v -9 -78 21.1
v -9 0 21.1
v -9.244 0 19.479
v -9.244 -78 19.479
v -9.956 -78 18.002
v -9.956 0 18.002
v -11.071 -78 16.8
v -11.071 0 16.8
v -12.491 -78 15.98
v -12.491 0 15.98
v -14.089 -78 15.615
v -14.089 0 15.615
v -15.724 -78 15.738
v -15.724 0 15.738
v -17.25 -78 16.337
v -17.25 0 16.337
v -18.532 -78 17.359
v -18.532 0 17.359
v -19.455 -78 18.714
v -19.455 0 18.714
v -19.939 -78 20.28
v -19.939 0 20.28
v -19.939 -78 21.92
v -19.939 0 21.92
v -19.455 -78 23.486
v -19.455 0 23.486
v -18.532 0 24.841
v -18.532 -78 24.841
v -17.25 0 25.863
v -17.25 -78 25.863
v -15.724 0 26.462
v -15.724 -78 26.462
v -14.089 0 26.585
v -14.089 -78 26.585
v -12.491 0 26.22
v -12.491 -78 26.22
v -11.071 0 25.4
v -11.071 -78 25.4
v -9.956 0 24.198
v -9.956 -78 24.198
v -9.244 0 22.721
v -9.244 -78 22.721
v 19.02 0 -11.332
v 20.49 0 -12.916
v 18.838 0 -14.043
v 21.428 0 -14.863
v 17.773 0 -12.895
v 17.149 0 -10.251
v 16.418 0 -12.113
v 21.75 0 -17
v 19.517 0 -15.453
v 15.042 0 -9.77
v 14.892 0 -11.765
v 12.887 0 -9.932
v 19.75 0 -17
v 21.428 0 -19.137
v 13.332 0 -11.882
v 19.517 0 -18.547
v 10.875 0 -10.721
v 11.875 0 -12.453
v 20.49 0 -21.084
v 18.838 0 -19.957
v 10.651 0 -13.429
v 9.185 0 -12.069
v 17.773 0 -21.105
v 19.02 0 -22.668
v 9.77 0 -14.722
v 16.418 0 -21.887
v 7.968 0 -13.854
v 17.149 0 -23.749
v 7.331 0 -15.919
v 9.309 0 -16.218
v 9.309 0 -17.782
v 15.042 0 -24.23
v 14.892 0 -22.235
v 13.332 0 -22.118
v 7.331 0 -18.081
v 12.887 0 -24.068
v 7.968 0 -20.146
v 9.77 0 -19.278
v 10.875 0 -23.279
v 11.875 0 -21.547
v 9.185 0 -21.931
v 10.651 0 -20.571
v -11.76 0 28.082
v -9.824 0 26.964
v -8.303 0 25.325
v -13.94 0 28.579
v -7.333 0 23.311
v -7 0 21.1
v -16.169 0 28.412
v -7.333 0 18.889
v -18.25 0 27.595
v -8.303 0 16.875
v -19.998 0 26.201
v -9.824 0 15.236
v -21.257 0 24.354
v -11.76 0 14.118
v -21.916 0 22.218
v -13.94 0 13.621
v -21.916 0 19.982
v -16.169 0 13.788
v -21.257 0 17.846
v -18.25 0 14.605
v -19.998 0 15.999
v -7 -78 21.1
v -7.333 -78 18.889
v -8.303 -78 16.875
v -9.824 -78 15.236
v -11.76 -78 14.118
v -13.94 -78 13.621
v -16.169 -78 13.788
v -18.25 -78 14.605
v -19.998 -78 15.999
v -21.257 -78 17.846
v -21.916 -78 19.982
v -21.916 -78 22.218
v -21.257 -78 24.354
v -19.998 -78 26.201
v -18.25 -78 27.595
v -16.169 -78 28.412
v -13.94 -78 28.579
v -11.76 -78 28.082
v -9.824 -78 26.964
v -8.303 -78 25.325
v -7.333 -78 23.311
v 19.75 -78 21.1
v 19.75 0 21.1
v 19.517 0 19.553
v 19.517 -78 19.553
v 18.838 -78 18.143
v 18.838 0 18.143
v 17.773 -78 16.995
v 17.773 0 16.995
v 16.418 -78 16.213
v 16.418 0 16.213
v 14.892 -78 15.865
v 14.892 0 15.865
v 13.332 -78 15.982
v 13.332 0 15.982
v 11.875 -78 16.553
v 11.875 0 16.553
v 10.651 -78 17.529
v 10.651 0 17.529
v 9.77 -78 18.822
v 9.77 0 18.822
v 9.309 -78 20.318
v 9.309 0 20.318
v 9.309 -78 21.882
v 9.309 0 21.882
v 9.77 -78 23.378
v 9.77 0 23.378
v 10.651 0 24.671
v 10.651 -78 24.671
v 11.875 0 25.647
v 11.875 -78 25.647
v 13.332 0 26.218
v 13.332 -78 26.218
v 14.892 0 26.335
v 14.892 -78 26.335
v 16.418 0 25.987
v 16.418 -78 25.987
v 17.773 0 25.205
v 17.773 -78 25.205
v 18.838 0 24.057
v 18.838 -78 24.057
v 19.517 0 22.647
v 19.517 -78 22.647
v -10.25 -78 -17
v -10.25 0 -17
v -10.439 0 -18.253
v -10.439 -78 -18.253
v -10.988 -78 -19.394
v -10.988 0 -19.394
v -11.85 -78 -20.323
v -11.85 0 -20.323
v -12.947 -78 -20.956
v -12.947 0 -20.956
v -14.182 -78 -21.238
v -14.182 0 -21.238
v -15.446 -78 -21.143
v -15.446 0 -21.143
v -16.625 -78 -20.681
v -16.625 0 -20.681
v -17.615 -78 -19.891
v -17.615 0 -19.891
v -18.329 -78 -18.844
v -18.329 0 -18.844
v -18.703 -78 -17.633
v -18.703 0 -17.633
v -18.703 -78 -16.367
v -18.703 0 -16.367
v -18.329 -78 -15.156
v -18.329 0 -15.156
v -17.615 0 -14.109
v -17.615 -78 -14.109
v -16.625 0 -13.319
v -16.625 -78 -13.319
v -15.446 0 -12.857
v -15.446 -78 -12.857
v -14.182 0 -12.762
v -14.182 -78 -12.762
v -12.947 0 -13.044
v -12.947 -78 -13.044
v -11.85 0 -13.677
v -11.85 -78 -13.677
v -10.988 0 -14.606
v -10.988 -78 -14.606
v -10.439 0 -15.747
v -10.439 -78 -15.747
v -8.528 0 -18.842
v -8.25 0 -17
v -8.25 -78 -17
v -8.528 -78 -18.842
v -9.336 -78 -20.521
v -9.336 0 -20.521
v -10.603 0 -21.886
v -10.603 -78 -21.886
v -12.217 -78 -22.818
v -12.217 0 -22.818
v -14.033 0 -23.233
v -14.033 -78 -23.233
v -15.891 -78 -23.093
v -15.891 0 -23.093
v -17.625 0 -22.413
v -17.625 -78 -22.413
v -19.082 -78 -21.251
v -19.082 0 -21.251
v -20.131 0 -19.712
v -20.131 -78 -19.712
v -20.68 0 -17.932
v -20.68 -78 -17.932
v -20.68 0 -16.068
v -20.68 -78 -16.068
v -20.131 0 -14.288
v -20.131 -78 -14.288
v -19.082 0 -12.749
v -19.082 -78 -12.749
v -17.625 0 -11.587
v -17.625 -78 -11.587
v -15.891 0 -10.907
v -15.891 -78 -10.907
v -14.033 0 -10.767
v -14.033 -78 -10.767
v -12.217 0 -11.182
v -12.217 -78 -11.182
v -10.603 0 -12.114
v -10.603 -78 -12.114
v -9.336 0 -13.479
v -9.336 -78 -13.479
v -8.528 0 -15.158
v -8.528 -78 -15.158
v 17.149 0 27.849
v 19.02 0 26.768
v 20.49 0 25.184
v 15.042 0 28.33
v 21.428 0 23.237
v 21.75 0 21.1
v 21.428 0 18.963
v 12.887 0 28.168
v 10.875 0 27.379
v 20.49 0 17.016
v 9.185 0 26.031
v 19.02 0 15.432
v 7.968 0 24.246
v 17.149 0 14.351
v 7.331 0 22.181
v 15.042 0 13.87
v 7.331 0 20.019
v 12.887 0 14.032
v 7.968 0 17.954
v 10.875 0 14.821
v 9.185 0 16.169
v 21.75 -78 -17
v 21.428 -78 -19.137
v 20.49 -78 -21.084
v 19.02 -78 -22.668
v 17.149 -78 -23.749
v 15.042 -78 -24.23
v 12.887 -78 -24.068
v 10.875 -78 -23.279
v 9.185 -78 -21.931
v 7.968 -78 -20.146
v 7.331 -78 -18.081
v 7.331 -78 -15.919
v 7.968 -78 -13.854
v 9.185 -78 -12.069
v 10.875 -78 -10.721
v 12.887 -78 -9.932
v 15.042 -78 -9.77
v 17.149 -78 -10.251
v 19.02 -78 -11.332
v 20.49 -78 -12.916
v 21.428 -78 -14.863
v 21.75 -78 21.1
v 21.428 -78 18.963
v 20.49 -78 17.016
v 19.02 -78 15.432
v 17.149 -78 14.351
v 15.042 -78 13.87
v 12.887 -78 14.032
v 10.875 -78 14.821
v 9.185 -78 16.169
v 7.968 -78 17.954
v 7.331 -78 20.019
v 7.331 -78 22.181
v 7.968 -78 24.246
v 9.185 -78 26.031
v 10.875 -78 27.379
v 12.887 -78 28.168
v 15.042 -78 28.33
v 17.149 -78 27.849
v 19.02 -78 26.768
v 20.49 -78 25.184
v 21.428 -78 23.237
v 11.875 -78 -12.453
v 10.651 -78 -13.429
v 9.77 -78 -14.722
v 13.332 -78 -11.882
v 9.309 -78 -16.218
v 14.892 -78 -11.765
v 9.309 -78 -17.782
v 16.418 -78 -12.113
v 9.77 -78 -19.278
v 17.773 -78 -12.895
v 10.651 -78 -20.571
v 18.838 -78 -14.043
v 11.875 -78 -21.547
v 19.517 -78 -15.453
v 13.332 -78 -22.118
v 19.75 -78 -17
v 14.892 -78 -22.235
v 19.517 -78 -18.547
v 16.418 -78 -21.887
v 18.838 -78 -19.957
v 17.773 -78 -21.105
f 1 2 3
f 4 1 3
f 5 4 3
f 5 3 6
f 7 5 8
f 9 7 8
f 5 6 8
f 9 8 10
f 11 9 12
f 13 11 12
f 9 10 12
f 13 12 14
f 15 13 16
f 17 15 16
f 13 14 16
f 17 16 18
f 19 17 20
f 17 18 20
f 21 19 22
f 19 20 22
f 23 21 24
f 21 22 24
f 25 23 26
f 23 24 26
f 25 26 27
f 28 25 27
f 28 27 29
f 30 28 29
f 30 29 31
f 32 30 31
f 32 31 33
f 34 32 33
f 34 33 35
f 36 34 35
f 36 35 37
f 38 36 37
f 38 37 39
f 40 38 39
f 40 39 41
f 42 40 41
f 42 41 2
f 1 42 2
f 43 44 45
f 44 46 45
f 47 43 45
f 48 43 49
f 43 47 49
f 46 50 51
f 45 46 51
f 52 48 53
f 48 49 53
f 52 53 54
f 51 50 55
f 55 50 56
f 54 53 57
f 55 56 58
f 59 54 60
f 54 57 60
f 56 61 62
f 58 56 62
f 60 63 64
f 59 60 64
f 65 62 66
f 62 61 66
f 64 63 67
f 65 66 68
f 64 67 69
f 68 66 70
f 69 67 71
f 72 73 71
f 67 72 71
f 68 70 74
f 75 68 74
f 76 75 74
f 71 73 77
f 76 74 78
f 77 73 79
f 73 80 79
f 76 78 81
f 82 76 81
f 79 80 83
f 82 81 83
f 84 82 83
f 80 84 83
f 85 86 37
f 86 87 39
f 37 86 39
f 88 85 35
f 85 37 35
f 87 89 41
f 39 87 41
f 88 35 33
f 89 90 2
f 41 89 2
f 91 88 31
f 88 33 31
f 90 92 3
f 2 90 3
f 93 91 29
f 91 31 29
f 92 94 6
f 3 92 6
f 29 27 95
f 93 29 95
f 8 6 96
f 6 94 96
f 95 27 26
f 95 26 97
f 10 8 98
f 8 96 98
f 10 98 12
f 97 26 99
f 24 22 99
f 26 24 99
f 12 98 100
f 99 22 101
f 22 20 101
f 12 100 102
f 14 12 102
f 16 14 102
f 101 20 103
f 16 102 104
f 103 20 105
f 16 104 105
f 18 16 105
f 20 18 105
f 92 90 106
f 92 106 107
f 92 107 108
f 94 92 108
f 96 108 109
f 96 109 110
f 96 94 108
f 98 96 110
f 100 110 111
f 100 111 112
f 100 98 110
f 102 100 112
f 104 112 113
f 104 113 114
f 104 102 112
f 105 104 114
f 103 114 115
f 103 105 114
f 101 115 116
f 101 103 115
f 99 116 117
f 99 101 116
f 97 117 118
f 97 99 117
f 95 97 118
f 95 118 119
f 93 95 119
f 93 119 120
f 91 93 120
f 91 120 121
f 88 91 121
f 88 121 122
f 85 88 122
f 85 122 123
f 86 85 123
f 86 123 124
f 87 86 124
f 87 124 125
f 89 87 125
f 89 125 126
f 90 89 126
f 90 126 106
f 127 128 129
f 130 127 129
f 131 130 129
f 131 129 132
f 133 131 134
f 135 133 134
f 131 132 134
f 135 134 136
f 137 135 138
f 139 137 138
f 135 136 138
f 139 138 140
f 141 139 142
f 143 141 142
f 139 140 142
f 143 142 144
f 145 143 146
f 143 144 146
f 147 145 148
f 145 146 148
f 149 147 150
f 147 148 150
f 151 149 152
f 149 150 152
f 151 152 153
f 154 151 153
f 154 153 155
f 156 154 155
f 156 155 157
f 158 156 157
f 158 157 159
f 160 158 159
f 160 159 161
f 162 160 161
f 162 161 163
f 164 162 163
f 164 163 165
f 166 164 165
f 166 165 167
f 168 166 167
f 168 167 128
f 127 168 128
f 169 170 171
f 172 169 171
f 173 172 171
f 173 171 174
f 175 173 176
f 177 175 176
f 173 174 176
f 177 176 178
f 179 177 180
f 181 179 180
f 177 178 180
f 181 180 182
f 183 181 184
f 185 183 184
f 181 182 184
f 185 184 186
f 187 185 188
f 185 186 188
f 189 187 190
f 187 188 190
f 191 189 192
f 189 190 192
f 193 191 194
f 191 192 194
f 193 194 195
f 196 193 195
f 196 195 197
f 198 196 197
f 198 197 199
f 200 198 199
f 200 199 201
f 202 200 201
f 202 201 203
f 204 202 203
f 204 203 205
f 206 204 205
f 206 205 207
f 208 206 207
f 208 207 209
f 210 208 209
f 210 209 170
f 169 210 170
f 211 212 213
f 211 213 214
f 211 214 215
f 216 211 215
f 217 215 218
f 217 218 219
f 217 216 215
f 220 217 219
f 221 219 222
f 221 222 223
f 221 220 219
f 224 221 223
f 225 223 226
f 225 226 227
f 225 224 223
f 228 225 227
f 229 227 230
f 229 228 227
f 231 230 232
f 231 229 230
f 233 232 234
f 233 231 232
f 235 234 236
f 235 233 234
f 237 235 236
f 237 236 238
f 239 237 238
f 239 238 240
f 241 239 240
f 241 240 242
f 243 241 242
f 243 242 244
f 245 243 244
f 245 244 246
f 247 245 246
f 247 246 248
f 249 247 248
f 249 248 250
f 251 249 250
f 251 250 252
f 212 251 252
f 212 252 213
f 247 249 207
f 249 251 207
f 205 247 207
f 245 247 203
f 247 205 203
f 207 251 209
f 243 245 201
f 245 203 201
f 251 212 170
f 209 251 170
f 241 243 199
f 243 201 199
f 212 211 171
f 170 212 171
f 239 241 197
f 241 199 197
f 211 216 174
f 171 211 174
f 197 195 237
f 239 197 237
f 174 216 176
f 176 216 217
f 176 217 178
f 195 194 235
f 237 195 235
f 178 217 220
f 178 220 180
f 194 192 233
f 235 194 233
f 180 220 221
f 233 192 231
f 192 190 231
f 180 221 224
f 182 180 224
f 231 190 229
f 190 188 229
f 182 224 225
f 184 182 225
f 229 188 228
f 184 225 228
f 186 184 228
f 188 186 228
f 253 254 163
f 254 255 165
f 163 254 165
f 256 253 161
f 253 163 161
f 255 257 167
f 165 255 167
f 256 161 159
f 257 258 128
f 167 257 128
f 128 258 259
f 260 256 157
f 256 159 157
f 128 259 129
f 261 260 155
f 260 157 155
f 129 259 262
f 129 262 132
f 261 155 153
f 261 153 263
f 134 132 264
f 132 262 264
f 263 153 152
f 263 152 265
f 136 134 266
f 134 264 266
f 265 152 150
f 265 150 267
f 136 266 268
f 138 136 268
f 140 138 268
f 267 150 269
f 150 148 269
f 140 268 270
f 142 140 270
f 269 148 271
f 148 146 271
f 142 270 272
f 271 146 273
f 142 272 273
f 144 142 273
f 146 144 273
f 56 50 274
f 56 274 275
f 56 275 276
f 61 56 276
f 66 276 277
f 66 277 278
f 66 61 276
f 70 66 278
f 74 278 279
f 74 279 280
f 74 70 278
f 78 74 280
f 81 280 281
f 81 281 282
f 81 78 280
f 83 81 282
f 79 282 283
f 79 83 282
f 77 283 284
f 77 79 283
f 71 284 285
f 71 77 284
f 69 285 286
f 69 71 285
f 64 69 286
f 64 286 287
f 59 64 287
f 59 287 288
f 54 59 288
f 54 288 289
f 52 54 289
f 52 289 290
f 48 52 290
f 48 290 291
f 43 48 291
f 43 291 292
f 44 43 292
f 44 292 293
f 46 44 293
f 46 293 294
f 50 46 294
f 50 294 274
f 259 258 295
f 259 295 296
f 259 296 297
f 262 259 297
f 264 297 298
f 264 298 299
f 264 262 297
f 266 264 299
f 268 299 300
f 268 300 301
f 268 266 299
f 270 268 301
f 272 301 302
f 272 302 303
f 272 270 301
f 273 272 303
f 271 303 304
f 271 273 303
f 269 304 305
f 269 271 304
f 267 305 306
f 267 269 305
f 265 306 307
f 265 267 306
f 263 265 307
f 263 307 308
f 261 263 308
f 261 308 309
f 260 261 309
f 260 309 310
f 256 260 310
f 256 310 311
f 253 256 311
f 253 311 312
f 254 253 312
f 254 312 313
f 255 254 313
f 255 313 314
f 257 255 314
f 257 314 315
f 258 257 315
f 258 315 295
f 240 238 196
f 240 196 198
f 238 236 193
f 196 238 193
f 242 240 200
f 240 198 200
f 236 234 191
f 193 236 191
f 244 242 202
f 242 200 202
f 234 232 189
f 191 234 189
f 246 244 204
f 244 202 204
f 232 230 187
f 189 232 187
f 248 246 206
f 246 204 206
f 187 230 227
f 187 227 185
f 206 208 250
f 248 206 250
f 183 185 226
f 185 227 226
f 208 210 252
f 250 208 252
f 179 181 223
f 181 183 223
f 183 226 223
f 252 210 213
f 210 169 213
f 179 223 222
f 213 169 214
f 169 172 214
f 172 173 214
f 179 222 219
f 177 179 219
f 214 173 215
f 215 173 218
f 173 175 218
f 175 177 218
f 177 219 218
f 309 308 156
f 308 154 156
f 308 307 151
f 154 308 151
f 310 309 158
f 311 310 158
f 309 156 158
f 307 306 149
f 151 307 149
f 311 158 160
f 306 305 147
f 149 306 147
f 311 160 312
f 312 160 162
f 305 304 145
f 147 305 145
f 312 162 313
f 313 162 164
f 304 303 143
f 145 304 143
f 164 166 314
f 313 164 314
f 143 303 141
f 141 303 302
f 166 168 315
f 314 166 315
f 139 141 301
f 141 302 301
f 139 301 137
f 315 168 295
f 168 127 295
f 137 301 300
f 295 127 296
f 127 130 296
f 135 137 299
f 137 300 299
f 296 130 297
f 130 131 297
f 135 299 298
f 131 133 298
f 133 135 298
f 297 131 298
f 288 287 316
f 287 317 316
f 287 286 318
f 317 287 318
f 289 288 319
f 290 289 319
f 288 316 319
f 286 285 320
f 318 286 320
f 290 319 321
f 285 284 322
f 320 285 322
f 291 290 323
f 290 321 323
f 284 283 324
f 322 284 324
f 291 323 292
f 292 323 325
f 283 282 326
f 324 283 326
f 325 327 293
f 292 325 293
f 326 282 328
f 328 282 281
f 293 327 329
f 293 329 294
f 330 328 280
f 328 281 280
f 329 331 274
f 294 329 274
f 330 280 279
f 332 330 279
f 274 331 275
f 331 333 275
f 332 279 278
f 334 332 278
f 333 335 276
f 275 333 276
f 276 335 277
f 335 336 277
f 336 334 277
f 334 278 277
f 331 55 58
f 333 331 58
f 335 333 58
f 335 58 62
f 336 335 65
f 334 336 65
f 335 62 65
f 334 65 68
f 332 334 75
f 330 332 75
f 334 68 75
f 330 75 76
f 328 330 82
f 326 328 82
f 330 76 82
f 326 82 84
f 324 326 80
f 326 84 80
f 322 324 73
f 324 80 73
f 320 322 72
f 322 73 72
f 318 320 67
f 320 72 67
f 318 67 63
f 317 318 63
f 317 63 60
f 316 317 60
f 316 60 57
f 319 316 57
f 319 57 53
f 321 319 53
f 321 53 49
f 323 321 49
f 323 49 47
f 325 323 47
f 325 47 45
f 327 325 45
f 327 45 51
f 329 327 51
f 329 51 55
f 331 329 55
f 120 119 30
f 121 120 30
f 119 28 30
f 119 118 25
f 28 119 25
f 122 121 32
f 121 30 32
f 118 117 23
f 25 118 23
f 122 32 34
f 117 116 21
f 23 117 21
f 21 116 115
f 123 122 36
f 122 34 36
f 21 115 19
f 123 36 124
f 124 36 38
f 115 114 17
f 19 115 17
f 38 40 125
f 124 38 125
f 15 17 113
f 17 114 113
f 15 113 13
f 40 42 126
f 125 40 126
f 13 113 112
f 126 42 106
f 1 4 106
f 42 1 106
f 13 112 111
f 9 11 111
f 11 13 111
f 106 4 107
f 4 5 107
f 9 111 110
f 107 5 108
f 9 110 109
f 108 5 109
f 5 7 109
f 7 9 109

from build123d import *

# Parameters (mm, degrees)
CROQUIS1_W              = 49
CROQUIS1_H              = 73
CROQUIS1_R              = 5.25
CROQUIS1_R_2            = 5.5
CROQUIS1_R_3            = 4.25
CROQUIS1_R_4            = 3
SALIENTE_EXTRUIR4_DEPTH = 2
CROQUIS7_W              = 49
CROQUIS7_H              = 5
SALIENTE_EXTRUIR5_DEPTH = 2
CROQUIS8_R              = 3
CORTAR_EXTRUIR2_DEPTH   = 10
CROQUIS9_R              = 6.25
CROQUIS9_R_2            = 4.25
SALIENTE_EXTRUIR6_DEPTH = 80
CROQUIS10_R             = 7.25
CROQUIS10_R_2           = 5.25
SALIENTE_EXTRUIR7_DEPTH = 80
CROQUIS11_R             = 7.5
CROQUIS11_R_2           = 5.5
CROQUIS11_R_3           = 7.25
CROQUIS11_R_4           = 5.25
SALIENTE_EXTRUIR8_DEPTH = 80
CROQUIS12_W             = 49.867597571
CROQUIS12_H             = 5.700105039
CORTAR_EXTRUIR3_DEPTH   = 79


with BuildPart() as part:
    # Croquis1 → Saliente-Extruir4 (new body)
    with BuildSketch(Plane(origin=(0, 0, 0), x_dir=(1, 0, 0), z_dir=(0, 1, 0))):
        with Locations((0, 0.5)):
            Rectangle(CROQUIS1_W, CROQUIS1_H)
        with Locations((14.5, -21.1)):
            Circle(CROQUIS1_R, mode=Mode.SUBTRACT)
        with Locations((-14.5, -21.1)):
            Circle(CROQUIS1_R_2, mode=Mode.SUBTRACT)
        with Locations((-14.5, 17)):
            Circle(CROQUIS1_R_3, mode=Mode.SUBTRACT)
        with Locations((14.5, 17)):
            Circle(CROQUIS1_R, mode=Mode.SUBTRACT)
        with Locations((-19.5, 32)):
            Circle(CROQUIS1_R_4, mode=Mode.SUBTRACT)
        with Locations((19.5, 32)):
            Circle(CROQUIS1_R_4, mode=Mode.SUBTRACT)
    extrude(amount=SALIENTE_EXTRUIR4_DEPTH)

    # Croquis7 → Saliente-Extruir5 (add)
    with BuildSketch(Plane(origin=(0, 2, 0), x_dir=(1, 0, 0), z_dir=(0, 1, 0))):
        with Locations((0, -38.5)):
            Rectangle(CROQUIS7_W, CROQUIS7_H)
    extrude(amount=-SALIENTE_EXTRUIR5_DEPTH)

    # Croquis8 → Cortar-Extruir2 (cut)
    with BuildSketch(Plane(origin=(0, 2, 0), x_dir=(1, 0, 0), z_dir=(0, 1, 0))):
        with Locations((-19.5, -36)):
            Circle(CROQUIS8_R)
        with Locations((19.5, -36)):
            Circle(CROQUIS8_R)
    extrude(amount=-CORTAR_EXTRUIR2_DEPTH, mode=Mode.SUBTRACT)

    # Croquis9 → Saliente-Extruir6 (add)
    with BuildSketch(Plane(origin=(0, 2, 0), x_dir=(1, 0, 0), z_dir=(0, 1, 0))):
        with Locations((-14.5, 17)):
            Circle(CROQUIS9_R)
        with Locations((-14.5, 17)):
            Circle(CROQUIS9_R_2, mode=Mode.SUBTRACT)
    extrude(amount=-SALIENTE_EXTRUIR6_DEPTH)

    # Croquis10 → Saliente-Extruir7 (add)
    with BuildSketch(Plane(origin=(0, 2, 0), x_dir=(1, 0, 0), z_dir=(0, 1, 0))):
        with Locations((14.5, 17)):
            Circle(CROQUIS10_R)
        with Locations((14.5, 17)):
            Circle(CROQUIS10_R_2, mode=Mode.SUBTRACT)
    extrude(amount=-SALIENTE_EXTRUIR7_DEPTH)

    # Croquis11 → Saliente-Extruir8 (add)
    with BuildSketch(Plane(origin=(0, 2, 0), x_dir=(1, 0, 0), z_dir=(0, 1, 0))):
        with Locations((-14.5, -21.1)):
            Circle(CROQUIS11_R)
        with Locations((-14.5, -21.1)):
            Circle(CROQUIS11_R_2, mode=Mode.SUBTRACT)
        with Locations((14.5, -21.1)):
            Circle(CROQUIS11_R_3)
        with Locations((14.5, -21.1)):
            Circle(CROQUIS11_R_4, mode=Mode.SUBTRACT)
    extrude(amount=-SALIENTE_EXTRUIR8_DEPTH)

    # Croquis12 → Cortar-Extruir3 (cut, through all)
    with BuildSketch(Plane(origin=(0, 0, -37), x_dir=(-1, 0, 0), z_dir=(0, 0, -1))):
        with Locations((0.433798786, 2.85005252)):
            Rectangle(CROQUIS12_W, CROQUIS12_H)
    extrude(amount=-CORTAR_EXTRUIR3_DEPTH, mode=Mode.SUBTRACT)


solid = part.part
